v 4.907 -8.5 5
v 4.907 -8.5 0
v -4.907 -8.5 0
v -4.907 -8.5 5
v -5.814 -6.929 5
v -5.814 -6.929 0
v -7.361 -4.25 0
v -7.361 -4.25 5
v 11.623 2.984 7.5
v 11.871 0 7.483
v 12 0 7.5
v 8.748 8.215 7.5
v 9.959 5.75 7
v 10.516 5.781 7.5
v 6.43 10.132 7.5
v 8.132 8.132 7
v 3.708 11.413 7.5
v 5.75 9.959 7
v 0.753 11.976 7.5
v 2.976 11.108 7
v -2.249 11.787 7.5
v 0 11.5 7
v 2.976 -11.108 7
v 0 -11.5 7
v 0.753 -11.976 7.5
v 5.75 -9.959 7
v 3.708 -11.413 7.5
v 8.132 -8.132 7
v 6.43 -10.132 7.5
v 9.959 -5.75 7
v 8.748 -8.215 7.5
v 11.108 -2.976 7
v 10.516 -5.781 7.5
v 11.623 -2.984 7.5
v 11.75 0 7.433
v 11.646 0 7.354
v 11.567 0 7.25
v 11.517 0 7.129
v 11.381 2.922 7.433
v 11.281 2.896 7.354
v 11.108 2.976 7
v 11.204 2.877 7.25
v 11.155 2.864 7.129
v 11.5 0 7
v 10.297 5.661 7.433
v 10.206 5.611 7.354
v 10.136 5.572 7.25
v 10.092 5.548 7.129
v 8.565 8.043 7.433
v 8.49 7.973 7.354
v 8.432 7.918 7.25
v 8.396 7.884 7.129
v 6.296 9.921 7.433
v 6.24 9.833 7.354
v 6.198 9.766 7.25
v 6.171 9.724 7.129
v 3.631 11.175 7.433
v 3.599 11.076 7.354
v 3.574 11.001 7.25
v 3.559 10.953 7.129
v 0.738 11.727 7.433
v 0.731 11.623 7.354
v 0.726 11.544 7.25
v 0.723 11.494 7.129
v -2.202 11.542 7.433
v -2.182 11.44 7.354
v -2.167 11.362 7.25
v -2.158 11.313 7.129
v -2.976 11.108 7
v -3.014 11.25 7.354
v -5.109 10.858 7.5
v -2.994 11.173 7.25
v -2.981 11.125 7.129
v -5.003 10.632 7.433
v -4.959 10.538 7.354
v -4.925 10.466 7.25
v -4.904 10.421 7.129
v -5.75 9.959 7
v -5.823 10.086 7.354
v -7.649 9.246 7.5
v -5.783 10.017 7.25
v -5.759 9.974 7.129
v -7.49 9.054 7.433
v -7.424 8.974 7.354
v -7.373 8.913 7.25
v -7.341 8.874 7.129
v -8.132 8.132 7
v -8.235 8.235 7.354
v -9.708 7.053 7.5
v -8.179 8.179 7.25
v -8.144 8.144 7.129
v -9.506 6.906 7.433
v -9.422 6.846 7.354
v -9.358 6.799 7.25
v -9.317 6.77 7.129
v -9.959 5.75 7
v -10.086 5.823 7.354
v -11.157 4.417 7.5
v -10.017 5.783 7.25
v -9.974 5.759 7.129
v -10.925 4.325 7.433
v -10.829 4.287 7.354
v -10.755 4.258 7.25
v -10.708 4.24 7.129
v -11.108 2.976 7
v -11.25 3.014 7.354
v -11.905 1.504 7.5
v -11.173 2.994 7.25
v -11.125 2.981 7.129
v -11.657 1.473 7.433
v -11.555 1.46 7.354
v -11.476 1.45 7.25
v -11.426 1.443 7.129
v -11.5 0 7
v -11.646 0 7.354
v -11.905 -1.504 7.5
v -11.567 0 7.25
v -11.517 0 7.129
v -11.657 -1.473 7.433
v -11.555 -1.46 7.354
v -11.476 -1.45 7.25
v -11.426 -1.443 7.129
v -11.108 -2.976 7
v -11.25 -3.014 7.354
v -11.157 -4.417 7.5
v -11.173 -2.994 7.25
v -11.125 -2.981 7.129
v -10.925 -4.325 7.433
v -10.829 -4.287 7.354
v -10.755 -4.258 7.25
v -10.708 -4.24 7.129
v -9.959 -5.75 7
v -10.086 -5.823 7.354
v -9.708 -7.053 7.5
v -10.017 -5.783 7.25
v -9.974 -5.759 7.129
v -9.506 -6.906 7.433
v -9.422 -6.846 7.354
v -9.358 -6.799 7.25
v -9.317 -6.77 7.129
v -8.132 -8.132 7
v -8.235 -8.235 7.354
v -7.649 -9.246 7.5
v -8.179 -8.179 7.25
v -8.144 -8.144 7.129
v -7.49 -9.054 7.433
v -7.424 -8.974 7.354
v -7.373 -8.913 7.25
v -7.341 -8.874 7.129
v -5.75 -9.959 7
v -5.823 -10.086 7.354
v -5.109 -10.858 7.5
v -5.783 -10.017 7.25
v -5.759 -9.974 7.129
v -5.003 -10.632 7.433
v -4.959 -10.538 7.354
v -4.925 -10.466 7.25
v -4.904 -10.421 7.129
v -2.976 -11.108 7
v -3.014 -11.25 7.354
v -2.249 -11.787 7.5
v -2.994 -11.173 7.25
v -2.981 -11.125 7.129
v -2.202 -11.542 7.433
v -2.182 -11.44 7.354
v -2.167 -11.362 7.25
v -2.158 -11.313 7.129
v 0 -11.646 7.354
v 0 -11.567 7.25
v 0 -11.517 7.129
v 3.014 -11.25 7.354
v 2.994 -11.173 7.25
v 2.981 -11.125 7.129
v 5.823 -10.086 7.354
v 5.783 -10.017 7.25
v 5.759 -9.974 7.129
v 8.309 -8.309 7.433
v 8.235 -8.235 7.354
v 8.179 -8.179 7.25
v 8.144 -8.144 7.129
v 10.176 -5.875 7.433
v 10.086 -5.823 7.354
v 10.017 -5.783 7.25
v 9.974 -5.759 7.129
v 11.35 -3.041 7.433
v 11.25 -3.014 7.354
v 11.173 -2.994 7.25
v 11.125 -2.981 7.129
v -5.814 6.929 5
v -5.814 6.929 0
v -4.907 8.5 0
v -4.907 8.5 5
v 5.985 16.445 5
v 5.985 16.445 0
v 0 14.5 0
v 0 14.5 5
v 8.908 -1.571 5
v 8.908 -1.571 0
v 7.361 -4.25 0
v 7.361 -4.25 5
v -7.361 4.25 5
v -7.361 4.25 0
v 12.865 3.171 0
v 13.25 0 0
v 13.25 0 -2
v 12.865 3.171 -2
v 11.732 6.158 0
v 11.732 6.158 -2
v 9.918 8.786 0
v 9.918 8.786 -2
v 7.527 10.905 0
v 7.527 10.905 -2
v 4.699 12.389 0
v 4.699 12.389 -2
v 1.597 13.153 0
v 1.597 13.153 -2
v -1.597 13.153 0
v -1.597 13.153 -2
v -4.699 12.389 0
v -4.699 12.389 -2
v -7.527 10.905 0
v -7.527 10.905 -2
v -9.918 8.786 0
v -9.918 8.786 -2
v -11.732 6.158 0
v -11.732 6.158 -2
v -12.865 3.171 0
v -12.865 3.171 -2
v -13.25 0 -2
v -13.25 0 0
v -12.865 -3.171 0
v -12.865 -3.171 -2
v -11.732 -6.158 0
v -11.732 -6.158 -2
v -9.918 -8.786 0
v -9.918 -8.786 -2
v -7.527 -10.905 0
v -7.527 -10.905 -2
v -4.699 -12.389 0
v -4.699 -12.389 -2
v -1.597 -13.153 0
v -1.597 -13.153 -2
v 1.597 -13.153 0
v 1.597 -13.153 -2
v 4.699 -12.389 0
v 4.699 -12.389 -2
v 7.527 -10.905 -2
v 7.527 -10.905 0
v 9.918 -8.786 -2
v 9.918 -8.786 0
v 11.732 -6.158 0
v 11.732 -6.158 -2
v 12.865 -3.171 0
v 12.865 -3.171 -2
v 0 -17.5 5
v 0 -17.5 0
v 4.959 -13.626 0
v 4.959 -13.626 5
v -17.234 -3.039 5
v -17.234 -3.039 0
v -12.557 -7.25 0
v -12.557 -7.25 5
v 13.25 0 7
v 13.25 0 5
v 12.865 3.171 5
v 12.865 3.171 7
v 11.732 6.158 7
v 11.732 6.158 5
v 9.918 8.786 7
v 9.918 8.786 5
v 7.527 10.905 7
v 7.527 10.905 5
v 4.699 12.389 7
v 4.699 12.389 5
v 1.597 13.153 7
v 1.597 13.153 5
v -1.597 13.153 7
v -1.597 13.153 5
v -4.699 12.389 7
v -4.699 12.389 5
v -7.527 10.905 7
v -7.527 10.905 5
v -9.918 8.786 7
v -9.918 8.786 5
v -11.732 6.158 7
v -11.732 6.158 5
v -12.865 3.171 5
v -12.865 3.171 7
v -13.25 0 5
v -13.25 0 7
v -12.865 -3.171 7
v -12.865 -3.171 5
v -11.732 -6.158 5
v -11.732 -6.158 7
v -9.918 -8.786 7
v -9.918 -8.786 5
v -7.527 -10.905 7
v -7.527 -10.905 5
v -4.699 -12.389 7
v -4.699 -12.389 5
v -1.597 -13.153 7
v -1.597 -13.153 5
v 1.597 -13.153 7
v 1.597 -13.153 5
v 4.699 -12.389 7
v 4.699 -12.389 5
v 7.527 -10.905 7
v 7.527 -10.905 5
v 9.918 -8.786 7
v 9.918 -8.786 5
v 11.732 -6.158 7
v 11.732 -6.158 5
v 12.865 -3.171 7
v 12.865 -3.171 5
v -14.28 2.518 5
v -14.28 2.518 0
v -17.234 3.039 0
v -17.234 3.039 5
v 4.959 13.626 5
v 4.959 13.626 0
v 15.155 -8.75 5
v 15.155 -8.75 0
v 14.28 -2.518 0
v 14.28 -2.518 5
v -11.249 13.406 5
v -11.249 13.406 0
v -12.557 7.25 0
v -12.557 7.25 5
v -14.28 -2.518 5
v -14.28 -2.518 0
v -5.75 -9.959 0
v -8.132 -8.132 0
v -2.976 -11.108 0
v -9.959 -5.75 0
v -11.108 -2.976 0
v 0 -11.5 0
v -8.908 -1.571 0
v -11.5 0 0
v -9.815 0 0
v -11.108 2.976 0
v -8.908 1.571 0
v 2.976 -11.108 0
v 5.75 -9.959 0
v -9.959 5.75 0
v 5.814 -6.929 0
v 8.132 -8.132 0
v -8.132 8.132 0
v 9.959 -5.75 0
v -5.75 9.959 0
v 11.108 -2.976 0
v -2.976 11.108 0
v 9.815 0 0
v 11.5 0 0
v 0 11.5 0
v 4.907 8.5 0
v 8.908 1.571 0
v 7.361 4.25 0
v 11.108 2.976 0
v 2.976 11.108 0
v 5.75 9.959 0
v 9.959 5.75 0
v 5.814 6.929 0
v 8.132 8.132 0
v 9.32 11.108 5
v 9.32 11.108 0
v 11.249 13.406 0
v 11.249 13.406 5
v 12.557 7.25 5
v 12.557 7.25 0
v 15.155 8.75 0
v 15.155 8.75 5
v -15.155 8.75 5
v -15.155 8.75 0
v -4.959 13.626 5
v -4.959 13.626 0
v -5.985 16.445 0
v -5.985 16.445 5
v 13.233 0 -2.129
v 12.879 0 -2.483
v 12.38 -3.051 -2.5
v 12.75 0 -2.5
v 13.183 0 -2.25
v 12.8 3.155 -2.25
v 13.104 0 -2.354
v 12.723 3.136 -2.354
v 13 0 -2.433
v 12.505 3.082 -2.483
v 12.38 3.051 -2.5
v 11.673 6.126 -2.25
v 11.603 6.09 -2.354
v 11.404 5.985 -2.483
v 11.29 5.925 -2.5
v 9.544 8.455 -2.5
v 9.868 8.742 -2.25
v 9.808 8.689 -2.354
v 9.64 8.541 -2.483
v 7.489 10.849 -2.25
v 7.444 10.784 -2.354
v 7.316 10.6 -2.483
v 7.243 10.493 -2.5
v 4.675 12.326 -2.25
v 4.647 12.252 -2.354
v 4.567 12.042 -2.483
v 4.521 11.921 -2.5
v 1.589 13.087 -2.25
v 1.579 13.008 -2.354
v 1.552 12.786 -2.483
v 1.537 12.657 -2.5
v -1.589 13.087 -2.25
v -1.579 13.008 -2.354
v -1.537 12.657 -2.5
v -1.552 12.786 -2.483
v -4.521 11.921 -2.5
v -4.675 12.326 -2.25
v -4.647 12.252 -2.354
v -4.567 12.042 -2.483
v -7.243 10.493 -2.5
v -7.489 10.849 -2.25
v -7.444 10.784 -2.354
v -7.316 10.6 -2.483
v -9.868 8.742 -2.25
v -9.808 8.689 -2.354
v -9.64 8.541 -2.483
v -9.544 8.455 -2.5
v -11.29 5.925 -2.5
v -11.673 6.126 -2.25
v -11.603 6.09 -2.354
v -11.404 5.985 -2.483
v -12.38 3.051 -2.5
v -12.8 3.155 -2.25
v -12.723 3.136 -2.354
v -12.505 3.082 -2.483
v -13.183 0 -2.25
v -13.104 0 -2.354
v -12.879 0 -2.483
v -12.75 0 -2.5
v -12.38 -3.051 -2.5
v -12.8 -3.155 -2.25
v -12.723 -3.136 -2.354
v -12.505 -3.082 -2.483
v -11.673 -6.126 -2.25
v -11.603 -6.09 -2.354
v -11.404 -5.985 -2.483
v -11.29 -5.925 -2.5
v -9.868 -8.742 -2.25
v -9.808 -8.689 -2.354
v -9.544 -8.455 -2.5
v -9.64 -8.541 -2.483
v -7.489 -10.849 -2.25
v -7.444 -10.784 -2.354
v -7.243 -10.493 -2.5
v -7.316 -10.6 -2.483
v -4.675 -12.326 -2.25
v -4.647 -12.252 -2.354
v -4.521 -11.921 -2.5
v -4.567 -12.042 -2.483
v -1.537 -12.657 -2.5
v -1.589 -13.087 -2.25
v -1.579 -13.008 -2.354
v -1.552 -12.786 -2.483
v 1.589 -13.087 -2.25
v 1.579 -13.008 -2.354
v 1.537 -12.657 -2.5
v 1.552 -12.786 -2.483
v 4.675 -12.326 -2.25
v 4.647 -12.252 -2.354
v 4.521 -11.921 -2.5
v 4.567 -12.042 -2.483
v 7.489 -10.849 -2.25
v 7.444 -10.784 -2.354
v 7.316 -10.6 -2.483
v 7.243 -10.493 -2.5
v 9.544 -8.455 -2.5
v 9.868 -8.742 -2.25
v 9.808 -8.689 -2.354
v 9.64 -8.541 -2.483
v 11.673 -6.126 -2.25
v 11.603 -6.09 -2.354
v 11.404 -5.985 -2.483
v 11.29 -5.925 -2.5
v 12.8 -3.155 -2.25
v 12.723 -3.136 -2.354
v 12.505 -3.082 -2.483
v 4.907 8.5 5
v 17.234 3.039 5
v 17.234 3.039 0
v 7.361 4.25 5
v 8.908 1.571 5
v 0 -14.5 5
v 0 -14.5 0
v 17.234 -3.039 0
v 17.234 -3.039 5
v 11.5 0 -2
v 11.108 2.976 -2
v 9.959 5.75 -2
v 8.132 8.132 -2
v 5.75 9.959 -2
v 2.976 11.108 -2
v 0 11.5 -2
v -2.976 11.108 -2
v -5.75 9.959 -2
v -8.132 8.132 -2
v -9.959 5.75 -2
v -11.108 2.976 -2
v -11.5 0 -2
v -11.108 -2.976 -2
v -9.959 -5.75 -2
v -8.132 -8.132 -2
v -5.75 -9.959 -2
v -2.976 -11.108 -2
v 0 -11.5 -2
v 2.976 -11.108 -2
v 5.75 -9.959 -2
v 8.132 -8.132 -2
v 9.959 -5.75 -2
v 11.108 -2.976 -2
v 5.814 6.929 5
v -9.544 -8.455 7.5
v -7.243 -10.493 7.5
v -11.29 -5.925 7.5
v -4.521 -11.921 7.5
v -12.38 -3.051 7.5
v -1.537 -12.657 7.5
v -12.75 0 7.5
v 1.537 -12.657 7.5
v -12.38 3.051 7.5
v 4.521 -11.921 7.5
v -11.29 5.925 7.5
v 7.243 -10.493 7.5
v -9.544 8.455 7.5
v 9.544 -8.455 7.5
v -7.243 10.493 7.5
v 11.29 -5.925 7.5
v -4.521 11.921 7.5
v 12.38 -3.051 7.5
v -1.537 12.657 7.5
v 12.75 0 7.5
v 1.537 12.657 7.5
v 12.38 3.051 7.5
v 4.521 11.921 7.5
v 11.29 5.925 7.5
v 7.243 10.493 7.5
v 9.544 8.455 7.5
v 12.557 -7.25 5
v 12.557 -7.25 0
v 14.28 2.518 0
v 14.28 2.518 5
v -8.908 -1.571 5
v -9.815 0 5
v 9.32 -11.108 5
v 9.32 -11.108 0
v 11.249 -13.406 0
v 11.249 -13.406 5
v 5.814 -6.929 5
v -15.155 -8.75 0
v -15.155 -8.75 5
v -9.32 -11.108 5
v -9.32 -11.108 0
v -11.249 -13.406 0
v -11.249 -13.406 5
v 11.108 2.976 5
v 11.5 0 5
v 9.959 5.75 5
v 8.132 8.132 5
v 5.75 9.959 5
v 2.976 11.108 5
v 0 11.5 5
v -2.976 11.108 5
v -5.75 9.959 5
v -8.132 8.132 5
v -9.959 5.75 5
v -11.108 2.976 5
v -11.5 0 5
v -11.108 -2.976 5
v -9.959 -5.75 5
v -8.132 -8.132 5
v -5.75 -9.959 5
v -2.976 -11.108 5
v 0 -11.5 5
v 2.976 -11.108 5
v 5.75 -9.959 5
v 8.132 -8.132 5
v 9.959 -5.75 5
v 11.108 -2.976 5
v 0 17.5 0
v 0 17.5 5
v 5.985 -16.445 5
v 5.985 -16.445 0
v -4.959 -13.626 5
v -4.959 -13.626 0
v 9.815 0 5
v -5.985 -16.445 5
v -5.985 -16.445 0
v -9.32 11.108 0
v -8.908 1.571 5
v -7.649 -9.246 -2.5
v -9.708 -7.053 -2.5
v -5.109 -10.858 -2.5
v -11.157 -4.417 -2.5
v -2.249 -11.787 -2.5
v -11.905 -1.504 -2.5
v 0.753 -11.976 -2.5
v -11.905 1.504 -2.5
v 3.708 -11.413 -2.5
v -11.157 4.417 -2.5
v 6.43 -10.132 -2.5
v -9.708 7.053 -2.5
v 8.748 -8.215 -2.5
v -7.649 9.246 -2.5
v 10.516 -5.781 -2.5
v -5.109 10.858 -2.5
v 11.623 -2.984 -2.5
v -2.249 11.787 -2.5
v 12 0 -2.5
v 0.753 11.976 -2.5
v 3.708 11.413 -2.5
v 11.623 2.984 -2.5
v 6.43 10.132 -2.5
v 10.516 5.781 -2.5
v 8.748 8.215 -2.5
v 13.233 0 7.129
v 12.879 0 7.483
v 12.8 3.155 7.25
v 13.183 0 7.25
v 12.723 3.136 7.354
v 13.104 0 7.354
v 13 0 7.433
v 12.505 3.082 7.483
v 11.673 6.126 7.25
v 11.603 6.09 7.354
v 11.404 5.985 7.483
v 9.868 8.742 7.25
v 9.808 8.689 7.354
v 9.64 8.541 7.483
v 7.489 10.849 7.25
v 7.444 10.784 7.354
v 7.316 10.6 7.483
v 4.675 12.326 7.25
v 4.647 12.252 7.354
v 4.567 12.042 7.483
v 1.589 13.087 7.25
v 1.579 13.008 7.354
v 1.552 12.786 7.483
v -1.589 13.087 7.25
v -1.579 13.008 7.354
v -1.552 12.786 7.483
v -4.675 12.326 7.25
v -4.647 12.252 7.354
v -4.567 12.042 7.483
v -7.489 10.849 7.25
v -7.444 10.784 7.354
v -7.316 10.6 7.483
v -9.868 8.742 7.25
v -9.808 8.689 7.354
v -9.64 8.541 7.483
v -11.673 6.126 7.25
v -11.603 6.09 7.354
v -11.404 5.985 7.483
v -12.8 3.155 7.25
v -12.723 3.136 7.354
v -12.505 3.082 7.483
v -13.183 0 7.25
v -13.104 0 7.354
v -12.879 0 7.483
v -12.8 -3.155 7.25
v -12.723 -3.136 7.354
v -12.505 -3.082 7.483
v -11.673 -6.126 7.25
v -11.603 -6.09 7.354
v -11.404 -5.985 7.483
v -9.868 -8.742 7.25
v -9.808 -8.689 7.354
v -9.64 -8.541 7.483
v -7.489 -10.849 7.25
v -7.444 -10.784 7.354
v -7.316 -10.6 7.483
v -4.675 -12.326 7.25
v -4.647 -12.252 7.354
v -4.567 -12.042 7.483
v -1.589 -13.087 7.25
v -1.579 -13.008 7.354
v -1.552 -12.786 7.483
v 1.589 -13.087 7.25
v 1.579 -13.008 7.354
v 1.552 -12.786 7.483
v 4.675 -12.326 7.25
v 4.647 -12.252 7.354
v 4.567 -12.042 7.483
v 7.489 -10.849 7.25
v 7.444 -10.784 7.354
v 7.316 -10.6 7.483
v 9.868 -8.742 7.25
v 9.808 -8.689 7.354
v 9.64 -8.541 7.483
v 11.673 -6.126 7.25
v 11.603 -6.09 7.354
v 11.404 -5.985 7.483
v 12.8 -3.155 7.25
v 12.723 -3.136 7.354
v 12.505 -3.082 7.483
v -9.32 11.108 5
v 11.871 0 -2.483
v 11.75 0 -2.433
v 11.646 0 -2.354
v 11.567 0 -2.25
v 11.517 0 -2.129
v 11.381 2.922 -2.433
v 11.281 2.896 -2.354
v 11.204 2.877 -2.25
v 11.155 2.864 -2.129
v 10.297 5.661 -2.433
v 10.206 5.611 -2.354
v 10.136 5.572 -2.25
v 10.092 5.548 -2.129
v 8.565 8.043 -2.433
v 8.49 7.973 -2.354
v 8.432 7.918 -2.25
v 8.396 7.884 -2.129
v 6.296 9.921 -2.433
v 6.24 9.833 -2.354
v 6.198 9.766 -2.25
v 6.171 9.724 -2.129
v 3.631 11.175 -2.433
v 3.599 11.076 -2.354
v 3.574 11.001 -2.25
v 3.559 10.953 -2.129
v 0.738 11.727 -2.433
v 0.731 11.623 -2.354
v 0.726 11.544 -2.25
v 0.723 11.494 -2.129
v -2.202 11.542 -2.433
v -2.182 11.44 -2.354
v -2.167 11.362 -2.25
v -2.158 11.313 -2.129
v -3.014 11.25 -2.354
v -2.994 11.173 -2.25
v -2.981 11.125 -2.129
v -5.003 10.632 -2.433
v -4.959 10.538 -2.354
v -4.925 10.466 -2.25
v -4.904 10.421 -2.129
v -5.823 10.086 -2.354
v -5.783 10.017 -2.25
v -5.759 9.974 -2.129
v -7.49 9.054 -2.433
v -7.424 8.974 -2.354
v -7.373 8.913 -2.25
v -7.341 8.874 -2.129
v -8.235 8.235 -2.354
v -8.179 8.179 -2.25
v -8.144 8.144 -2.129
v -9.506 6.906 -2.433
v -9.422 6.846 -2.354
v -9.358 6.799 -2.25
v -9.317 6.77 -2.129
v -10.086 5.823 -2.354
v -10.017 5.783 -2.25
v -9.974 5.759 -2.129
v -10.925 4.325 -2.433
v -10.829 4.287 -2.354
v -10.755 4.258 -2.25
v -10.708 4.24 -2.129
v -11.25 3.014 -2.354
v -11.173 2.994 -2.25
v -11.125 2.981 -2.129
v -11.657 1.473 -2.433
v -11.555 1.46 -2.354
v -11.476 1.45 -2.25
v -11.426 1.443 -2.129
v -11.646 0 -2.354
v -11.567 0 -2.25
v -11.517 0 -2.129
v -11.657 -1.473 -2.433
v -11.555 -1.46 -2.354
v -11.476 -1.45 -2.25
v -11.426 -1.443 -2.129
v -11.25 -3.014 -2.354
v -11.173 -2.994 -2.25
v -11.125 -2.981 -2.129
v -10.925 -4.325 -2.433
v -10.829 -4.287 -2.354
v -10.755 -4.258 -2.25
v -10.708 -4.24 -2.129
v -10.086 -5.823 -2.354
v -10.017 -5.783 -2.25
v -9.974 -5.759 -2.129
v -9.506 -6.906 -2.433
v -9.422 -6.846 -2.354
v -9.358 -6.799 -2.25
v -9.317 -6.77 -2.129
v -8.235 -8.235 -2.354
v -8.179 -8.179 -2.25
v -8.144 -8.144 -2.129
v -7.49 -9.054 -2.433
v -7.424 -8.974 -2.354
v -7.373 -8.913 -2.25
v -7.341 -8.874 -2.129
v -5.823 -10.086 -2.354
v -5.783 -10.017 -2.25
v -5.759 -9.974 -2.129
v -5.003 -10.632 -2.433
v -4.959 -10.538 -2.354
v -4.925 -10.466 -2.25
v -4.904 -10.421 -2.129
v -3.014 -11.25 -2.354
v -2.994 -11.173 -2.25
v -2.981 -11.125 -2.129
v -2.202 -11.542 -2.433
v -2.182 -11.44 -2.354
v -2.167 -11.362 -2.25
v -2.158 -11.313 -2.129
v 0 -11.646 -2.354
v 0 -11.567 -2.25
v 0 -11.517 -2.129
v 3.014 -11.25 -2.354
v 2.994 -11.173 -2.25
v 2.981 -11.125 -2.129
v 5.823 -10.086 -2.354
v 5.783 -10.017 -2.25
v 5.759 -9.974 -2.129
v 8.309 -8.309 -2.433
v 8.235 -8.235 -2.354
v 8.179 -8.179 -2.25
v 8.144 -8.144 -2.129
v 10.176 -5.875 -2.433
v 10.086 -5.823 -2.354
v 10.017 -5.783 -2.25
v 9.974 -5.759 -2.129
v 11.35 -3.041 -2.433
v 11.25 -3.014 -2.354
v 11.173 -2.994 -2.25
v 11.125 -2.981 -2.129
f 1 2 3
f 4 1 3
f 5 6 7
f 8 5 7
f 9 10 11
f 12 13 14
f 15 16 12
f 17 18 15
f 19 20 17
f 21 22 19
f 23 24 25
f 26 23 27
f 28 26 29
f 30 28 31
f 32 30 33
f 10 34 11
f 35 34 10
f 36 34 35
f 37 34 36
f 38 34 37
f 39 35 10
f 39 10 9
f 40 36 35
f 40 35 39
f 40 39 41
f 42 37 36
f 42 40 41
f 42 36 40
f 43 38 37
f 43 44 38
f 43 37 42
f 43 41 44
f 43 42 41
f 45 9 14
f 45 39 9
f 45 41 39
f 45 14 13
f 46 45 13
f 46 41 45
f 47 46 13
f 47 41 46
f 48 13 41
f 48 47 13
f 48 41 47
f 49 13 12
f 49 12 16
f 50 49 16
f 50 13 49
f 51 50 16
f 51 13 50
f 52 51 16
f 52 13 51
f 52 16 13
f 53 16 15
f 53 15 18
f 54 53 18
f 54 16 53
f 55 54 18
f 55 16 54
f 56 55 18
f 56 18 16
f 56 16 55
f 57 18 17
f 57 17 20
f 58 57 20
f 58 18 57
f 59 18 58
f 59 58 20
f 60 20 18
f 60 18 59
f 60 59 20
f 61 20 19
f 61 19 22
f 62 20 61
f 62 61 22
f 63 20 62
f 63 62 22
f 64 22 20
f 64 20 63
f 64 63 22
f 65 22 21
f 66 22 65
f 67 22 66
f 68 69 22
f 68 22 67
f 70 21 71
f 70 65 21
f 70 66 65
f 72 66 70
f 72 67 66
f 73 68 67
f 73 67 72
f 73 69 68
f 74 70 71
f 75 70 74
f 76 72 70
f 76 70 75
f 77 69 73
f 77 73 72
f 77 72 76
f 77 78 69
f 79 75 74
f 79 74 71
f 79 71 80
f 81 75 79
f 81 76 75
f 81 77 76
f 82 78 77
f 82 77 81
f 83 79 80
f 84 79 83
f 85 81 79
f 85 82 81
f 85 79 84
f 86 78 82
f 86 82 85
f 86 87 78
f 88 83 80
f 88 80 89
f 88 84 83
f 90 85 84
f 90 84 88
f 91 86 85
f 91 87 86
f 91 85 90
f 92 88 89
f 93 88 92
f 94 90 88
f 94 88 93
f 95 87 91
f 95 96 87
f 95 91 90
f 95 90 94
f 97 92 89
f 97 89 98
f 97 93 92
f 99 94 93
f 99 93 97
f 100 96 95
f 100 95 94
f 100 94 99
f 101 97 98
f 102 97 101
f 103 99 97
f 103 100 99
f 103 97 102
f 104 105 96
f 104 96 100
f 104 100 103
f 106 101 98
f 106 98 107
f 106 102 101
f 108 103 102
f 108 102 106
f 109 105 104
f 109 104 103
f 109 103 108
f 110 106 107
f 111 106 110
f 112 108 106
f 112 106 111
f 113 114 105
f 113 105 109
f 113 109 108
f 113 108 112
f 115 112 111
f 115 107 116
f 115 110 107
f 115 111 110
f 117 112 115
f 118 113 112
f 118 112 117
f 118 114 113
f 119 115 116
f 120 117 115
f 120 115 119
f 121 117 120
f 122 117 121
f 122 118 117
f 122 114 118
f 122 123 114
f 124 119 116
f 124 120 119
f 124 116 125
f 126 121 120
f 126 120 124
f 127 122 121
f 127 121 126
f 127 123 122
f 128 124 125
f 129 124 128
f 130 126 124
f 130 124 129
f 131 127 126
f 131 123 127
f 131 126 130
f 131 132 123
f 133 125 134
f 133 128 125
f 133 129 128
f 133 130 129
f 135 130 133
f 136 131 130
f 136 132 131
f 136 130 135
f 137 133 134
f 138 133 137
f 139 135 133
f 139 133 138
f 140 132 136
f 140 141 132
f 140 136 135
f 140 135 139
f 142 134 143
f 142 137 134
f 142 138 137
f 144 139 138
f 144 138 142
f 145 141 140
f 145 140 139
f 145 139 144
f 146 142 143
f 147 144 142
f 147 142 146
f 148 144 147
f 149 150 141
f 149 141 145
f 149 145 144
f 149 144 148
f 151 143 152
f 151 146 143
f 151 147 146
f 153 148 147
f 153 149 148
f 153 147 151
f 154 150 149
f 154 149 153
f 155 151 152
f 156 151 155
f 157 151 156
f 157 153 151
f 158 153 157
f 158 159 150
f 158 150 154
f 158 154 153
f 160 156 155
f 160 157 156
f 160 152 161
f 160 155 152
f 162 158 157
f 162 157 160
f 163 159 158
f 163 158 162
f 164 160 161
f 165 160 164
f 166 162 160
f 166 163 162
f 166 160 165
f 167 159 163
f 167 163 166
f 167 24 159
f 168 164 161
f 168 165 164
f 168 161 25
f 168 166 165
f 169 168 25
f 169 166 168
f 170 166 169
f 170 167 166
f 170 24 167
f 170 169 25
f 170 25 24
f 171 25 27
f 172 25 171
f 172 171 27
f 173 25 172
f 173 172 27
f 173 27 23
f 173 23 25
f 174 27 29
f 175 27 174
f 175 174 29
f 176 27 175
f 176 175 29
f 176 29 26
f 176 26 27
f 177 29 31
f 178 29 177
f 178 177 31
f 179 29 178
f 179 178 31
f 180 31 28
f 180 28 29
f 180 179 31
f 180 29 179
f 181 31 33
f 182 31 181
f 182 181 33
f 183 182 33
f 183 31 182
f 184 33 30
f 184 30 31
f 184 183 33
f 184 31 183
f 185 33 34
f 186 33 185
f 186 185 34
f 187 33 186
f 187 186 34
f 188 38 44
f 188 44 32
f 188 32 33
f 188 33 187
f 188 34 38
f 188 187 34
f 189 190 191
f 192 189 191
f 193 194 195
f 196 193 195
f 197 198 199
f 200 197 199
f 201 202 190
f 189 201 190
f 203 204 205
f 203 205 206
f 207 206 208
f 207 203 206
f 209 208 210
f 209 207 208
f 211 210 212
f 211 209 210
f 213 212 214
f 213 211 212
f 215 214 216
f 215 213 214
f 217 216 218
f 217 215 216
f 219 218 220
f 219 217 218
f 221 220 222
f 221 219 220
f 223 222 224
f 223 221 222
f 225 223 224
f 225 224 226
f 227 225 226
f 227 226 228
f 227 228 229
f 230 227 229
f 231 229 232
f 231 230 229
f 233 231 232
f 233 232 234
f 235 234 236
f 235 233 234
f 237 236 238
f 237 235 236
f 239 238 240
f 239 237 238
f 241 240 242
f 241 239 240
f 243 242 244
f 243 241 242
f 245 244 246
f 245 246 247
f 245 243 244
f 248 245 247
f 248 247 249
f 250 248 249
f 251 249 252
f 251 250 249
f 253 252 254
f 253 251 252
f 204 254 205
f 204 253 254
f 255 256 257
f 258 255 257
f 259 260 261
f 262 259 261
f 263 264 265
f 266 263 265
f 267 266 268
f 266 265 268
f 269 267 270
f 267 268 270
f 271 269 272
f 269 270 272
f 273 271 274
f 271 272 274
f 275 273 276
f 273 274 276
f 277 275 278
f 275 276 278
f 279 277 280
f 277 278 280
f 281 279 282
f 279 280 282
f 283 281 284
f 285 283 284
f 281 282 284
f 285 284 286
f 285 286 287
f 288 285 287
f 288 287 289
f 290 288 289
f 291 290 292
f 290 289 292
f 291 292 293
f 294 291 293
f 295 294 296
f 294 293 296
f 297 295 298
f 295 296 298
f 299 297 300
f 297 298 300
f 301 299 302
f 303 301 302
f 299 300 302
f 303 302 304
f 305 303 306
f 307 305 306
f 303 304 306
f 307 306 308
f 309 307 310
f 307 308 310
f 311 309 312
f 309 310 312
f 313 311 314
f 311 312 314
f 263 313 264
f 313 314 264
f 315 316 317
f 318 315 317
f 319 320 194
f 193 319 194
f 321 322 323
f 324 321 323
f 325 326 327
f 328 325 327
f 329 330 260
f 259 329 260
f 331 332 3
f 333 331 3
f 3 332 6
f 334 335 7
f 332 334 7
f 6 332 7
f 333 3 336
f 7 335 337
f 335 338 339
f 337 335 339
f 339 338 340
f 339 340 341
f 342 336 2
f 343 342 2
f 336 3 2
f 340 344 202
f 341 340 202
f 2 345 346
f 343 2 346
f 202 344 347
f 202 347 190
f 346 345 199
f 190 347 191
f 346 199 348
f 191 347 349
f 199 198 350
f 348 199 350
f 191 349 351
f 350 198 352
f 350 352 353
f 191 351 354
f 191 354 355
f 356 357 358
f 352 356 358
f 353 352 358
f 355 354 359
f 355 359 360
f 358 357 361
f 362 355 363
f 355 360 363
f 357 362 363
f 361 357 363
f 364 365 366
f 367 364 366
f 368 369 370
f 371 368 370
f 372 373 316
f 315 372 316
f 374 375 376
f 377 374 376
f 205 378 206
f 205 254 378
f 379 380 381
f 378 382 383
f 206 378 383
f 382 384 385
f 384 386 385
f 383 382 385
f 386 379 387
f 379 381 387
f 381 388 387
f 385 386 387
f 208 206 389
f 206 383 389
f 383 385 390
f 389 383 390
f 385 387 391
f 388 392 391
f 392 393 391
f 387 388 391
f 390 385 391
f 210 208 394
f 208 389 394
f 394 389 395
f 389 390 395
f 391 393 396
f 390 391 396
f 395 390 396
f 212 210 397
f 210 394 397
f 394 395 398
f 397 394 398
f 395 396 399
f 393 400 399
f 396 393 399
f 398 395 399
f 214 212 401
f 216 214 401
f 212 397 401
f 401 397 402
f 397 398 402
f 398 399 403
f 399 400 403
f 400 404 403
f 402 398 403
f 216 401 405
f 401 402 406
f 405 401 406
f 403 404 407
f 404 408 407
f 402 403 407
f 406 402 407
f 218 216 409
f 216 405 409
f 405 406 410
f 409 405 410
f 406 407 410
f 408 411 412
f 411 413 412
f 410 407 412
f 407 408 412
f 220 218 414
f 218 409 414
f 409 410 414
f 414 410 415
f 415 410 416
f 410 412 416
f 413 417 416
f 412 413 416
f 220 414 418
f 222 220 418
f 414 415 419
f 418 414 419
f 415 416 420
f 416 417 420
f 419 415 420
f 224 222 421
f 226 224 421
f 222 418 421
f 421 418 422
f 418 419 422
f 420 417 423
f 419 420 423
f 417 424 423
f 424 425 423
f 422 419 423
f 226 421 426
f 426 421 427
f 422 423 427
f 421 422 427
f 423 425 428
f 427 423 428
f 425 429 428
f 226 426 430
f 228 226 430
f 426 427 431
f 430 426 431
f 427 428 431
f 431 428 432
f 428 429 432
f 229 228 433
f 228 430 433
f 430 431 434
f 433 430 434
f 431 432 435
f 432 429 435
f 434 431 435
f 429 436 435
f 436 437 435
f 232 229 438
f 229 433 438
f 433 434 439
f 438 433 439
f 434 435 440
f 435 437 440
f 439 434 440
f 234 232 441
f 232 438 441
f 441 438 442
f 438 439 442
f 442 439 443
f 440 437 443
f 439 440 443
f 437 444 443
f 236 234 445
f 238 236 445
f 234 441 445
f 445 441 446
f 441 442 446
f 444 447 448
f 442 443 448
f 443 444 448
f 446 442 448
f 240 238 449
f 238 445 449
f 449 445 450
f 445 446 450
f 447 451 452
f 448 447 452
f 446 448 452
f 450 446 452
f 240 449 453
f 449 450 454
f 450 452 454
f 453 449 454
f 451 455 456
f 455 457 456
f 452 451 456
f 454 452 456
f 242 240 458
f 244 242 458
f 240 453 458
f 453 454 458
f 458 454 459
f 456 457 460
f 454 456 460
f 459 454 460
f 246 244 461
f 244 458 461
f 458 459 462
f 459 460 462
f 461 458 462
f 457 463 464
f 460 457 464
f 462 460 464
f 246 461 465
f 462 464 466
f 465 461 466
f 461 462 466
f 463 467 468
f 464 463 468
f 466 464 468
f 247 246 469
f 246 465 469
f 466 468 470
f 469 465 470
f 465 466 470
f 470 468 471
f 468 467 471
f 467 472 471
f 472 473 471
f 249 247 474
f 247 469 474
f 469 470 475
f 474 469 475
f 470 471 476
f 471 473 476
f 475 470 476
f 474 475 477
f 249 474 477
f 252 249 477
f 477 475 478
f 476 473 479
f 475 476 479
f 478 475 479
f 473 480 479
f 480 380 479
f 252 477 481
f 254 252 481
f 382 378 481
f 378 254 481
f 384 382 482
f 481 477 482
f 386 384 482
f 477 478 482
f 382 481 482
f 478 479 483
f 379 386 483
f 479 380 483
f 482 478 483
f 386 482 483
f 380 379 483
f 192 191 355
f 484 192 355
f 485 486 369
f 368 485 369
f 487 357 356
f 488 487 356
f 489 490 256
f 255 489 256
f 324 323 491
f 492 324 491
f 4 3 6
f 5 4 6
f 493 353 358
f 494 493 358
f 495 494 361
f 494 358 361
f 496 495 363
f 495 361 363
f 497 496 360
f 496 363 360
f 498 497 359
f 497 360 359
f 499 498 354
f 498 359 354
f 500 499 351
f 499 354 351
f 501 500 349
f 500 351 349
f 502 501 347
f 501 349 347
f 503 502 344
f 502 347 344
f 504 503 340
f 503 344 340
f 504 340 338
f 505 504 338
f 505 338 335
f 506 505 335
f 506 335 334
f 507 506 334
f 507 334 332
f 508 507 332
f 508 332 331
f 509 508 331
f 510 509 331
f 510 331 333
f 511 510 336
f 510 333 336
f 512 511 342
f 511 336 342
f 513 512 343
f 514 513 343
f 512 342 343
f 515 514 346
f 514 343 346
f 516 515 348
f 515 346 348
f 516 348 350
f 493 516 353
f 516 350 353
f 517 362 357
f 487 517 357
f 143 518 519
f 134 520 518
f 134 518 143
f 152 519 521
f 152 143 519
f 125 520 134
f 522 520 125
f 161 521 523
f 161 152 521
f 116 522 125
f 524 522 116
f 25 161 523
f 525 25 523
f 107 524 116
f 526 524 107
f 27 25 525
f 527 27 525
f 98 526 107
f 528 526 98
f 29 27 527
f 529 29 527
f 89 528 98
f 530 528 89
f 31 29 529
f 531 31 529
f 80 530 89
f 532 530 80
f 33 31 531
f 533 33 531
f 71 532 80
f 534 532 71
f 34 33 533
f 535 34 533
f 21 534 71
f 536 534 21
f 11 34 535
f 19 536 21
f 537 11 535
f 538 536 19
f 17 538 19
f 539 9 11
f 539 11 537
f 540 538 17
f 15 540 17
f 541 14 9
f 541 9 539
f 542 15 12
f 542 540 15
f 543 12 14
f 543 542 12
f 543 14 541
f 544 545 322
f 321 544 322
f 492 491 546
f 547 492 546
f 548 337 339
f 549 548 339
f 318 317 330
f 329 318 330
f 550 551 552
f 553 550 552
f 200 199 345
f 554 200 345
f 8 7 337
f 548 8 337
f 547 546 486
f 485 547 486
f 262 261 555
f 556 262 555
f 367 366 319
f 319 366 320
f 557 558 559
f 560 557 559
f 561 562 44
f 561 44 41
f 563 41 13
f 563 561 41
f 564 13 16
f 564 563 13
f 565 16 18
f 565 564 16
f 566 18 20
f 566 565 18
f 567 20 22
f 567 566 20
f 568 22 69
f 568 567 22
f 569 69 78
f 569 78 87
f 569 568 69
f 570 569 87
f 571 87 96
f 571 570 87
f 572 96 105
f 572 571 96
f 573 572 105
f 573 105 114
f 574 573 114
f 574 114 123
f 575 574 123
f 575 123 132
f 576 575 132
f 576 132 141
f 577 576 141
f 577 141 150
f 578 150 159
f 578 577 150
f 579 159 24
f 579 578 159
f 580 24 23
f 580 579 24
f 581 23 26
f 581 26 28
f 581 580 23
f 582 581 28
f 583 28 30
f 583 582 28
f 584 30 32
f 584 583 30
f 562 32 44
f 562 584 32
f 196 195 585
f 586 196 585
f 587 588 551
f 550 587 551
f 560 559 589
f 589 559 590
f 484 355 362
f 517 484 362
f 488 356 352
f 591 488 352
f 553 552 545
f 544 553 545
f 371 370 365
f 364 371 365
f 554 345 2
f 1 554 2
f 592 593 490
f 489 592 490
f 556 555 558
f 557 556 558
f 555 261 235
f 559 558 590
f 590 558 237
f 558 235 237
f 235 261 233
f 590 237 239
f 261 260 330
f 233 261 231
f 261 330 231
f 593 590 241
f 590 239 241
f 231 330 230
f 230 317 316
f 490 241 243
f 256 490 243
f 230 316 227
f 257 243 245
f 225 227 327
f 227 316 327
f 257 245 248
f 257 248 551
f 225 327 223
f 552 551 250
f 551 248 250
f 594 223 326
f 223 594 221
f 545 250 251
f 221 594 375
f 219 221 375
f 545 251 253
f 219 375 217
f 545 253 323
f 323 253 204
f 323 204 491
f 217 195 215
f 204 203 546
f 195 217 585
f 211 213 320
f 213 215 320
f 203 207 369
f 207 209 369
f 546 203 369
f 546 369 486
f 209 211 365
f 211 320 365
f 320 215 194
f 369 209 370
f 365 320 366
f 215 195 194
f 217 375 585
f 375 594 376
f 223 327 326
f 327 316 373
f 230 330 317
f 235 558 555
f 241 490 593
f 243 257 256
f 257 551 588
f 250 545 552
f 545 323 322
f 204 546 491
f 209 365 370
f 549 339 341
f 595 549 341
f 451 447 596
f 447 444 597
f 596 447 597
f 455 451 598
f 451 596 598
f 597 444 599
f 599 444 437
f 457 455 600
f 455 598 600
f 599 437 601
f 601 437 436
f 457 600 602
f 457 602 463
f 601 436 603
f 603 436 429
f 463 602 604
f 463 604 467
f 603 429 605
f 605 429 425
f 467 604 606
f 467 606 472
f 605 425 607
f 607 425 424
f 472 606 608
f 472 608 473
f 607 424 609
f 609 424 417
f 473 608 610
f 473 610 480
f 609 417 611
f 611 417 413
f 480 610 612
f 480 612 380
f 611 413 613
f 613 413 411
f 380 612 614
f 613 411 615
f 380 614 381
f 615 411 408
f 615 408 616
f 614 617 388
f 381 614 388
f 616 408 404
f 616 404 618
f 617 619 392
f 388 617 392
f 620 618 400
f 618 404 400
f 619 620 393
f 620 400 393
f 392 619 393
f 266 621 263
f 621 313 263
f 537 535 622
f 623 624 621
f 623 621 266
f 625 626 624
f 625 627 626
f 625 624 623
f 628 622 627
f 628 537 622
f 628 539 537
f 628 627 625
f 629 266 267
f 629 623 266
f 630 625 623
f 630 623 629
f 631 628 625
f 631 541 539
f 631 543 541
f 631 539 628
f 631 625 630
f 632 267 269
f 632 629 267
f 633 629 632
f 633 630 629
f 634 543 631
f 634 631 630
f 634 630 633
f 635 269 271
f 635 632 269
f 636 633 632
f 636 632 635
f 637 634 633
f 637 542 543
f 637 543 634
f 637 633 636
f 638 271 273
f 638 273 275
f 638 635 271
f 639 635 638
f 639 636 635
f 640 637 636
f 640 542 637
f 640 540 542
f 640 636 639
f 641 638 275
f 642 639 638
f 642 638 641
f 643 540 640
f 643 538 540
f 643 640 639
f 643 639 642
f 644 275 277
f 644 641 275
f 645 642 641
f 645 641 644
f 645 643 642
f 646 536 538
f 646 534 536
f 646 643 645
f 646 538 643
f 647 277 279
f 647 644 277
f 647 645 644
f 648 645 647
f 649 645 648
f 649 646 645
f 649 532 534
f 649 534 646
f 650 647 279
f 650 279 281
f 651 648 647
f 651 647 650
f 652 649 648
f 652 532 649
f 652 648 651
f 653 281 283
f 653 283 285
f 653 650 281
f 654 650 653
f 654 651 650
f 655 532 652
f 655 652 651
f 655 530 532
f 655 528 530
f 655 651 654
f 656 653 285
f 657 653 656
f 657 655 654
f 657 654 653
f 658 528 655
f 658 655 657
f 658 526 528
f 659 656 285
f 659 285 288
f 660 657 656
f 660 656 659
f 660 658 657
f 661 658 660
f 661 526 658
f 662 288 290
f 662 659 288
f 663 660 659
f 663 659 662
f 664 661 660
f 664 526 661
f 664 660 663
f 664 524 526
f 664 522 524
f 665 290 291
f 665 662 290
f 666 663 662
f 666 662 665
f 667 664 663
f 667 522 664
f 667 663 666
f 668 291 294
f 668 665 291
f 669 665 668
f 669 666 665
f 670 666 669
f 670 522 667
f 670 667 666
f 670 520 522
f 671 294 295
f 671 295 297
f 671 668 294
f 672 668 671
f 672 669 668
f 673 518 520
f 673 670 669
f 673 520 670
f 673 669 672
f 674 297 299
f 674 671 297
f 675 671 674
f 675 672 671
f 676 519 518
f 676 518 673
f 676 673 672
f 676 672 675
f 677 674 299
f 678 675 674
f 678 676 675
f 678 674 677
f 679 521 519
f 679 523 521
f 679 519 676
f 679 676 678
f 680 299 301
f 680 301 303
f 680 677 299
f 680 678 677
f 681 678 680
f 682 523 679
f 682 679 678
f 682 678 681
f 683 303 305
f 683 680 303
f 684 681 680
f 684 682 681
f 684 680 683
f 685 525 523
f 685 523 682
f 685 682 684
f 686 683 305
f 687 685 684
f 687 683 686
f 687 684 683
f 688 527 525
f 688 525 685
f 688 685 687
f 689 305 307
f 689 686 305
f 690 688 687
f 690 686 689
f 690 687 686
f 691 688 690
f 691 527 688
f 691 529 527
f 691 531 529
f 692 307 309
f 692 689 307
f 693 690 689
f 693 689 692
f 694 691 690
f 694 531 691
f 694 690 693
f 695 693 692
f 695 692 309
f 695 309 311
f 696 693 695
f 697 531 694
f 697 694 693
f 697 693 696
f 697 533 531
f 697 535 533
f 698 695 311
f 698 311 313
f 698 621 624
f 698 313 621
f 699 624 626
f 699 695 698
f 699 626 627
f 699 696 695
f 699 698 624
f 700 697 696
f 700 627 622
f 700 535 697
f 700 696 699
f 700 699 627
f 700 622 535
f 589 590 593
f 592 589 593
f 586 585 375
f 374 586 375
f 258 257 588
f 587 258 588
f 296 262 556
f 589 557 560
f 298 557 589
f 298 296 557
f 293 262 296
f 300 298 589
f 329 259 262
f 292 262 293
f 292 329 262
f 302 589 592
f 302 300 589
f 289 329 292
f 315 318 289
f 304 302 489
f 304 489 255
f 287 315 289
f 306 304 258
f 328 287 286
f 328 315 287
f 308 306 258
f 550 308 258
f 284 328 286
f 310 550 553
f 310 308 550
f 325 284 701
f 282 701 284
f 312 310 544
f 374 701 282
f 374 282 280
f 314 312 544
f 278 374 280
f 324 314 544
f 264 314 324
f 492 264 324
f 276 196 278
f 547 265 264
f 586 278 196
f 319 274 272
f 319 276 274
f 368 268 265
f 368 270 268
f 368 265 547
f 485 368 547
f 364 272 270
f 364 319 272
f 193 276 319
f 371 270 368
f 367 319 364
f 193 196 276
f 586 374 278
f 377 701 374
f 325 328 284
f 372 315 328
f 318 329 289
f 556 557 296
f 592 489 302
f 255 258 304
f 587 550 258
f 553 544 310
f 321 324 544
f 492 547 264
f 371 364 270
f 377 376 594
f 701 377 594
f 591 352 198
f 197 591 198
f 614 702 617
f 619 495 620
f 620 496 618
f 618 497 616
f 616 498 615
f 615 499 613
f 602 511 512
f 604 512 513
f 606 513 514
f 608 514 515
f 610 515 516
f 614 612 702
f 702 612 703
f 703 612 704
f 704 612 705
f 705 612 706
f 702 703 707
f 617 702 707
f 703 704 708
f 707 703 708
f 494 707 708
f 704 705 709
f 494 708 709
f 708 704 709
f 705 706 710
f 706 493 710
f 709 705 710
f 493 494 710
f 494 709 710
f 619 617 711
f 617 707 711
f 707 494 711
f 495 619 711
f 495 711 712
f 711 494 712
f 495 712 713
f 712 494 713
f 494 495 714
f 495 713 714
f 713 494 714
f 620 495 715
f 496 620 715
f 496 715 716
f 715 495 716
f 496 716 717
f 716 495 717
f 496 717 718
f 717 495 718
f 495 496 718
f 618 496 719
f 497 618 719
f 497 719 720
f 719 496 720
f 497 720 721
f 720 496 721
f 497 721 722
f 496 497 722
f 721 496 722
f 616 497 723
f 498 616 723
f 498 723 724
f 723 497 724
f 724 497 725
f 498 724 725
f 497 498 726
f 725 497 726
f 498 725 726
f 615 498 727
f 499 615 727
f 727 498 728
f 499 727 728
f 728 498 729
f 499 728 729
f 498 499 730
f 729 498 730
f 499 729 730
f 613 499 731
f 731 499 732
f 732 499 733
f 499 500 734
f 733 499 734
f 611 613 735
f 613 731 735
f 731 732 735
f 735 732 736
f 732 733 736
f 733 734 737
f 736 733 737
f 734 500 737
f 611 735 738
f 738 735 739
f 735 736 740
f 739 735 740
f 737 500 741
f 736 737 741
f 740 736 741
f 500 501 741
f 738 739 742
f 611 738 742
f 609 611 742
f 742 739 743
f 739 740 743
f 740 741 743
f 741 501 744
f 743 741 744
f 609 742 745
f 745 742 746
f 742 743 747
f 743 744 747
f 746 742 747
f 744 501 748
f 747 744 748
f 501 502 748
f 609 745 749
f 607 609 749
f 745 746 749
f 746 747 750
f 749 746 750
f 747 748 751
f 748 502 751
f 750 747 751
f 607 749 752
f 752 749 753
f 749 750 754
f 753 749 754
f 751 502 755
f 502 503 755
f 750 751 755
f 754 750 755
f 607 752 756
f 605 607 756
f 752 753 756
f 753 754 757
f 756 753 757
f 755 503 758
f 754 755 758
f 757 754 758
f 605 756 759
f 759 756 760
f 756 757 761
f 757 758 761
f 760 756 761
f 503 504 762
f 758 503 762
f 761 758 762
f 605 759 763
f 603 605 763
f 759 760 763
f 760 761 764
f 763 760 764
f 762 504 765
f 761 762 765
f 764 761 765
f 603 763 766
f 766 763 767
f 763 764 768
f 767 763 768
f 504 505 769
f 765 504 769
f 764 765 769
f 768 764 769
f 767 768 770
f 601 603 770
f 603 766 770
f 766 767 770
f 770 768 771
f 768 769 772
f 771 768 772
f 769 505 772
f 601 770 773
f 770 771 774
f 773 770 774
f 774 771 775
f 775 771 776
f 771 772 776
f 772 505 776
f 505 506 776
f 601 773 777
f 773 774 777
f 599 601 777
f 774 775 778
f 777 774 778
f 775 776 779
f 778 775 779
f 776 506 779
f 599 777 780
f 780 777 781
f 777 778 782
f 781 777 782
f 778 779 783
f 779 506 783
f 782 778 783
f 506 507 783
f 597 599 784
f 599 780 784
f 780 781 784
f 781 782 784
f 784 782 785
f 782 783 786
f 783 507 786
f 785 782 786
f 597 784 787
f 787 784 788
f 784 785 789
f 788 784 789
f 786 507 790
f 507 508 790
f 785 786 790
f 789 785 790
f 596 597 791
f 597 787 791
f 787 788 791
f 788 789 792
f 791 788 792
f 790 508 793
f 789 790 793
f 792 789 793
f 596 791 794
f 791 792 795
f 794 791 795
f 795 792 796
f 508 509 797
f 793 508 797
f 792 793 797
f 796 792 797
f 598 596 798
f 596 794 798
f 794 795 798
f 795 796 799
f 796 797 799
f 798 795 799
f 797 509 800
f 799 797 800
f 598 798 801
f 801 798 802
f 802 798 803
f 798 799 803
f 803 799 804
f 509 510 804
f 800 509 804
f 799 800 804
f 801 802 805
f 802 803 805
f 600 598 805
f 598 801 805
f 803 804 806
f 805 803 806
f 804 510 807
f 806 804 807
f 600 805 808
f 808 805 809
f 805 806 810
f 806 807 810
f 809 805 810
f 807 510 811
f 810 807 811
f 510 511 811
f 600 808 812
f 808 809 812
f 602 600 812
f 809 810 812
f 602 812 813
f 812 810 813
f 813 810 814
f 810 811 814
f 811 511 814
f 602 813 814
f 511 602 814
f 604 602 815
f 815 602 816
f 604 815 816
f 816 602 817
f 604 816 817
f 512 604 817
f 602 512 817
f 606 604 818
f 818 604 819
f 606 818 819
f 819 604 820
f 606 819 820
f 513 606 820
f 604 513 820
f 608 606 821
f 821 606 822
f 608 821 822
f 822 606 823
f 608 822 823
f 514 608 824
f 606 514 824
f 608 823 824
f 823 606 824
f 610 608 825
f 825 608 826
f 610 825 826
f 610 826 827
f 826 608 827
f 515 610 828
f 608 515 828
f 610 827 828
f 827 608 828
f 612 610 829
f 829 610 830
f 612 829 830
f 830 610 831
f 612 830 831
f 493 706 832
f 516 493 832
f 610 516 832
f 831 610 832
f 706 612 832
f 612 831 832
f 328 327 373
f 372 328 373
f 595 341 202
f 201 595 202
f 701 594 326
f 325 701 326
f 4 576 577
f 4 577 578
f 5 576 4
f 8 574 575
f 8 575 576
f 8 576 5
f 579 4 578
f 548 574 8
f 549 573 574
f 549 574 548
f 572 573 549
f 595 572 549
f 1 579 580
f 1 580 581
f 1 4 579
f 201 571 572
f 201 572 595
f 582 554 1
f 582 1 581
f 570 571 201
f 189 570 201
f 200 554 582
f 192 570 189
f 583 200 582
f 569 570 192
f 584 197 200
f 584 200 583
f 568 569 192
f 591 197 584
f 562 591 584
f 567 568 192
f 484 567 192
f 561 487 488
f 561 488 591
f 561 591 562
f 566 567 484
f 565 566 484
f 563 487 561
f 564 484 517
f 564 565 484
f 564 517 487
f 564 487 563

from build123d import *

# Parameters (mm, degrees)
F1_DEPTH = 5
F2_R     = 13.25
F2_R_2   = 11.5
F3_DEPTH = 2.5
F4_R     = 13.25
F4_R_2   = 11.5
F5_DEPTH = 2.5
F6_R     = 0.5


with BuildPart() as f1:
    # F0 (on Top) → F1 (new body)
    with BuildSketch(Plane.XY):
        with BuildLine():
            Line((3.0937469913, 8.5), (4.9592920782, 13.6255430014))
            ThreePointArc((4.9592920782, 13.6255430014), (2.5178985762, 14.2797124187), (0, 14.5))
            Line((0, 14.5), (0, 8.5))
            Line((0, 8.5), (3.0937469913, 8.5))
        make_face()
        with BuildLine():
            ThreePointArc((0, 14.5), (2.5178985762, 14.2797124187), (4.9592920782, 13.6255430014))
            Line((4.9592920782, 13.6255430014), (5.9853525082, 16.4446208638))
            Line((5.9853525082, 16.4446208638), (0, 14.5))
        make_face()
        with BuildLine():
            Line((-3.0937469913, 8.5), (0, 8.5))
            Line((0, 8.5), (0, 14.5))
            ThreePointArc((0, 14.5), (-2.5178985762, 14.2797124187), (-4.9592920782, 13.6255430014))
            Line((-4.9592920782, 13.6255430014), (-3.0937469913, 8.5))
        make_face()
        with BuildLine():
            ThreePointArc((-4.9592920782, 13.6255430014), (-2.5178985762, 14.2797124187), (0, 14.5))
            Line((0, 14.5), (0, 17.5))
            Line((0, 17.5), (-4.9592920782, 13.6255430014))
        make_face()
        with BuildLine():
            Line((5.8143424365, 6.9292634873), (9.3204203405, 11.1076444252))
            ThreePointArc((9.3204203405, 11.1076444252), (7.25, 12.5573683549), (4.9592920782, 13.6255430014))
            Line((4.9592920782, 13.6255430014), (3.0937469913, 8.5))
            Line((3.0937469913, 8.5), (4.9074772881, 8.5))
            Line((4.9074772881, 8.5), (5.8143424365, 6.9292634873))
        make_face()
        with BuildLine():
            ThreePointArc((4.9592920782, 13.6255430014), (7.25, 12.5573683549), (9.3204203405, 11.1076444252))
            Line((9.3204203405, 11.1076444252), (11.2487831695, 13.4057777546))
            Line((11.2487831695, 13.4057777546), (4.9592920782, 13.6255430014))
        make_face()
        with BuildLine():
            ThreePointArc((9.3204203405, 11.1076444252), (11.1076444252, 9.3204203405), (12.5573683549, 7.25))
            Line((12.5573683549, 7.25), (15.1554445662, 8.75))
            Line((15.1554445662, 8.75), (9.3204203405, 11.1076444252))
        make_face()
        with BuildLine():
            Line((8.9080894278, 1.5707365127), (14.2797124187, 2.5178985762))
            ThreePointArc((14.2797124187, 2.5178985762), (13.6255430014, 4.9592920782), (12.5573683549, 7.25))
            Line((12.5573683549, 7.25), (7.3612159322, 4.25))
            Line((7.3612159322, 4.25), (8.9080894278, 1.5707365127))
        make_face()
        with BuildLine():
            ThreePointArc((12.5573683549, 7.25), (13.6255430014, 4.9592920782), (14.2797124187, 2.5178985762))
            Line((14.2797124187, 2.5178985762), (17.2341356777, 3.0388431092))
            Line((17.2341356777, 3.0388431092), (12.5573683549, 7.25))
        make_face()
        with BuildLine():
            ThreePointArc((14.2797124187, -2.5178985762), (14.4448231223, -1.2637582698), (14.5, 0))
            ThreePointArc((14.5, 0), (14.4448231223, 1.2637582698), (14.2797124187, 2.5178985762))
            Line((14.2797124187, 2.5178985762), (8.9080894278, 1.5707365127))
            Line((8.9080894278, 1.5707365127), (9.8149545762, 0))
            Line((9.8149545762, 0), (8.9080894278, -1.5707365127))
            Line((8.9080894278, -1.5707365127), (14.2797124187, -2.5178985762))
        make_face()
        with BuildLine():
            ThreePointArc((14.2797124187, 2.5178985762), (14.4448231223, 1.2637582698), (14.5, 0))
            ThreePointArc((14.5, 0), (14.4448231223, -1.2637582698), (14.2797124187, -2.5178985762))
            Line((14.2797124187, -2.5178985762), (17.2341356777, -3.0388431092))
            Line((17.2341356777, -3.0388431092), (14.2797124187, 2.5178985762))
        make_face()
        with BuildLine():
            ThreePointArc((12.5573683549, -7.25), (13.6255430014, -4.9592920782), (14.2797124187, -2.5178985762))
            Line((14.2797124187, -2.5178985762), (8.9080894278, -1.5707365127))
            Line((8.9080894278, -1.5707365127), (7.3612159322, -4.25))
            Line((7.3612159322, -4.25), (12.5573683549, -7.25))
        make_face()
        with BuildLine():
            Line((15.1554445662, -8.75), (14.2797124187, -2.5178985762))
            ThreePointArc((14.2797124187, -2.5178985762), (13.6255430014, -4.9592920782), (12.5573683549, -7.25))
            Line((12.5573683549, -7.25), (15.1554445662, -8.75))
        make_face()
        with BuildLine():
            ThreePointArc((9.3204203405, -11.1076444252), (11.1076444252, -9.3204203405), (12.5573683549, -7.25))
            Line((12.5573683549, -7.25), (7.3612159322, -4.25))
            Line((7.3612159322, -4.25), (5.8143424365, -6.9292634873))
            Line((5.8143424365, -6.9292634873), (9.3204203405, -11.1076444252))
        make_face()
        with BuildLine():
            Line((11.2487831695, -13.4057777546), (12.5573683549, -7.25))
            ThreePointArc((12.5573683549, -7.25), (11.1076444252, -9.3204203405), (9.3204203405, -11.1076444252))
            Line((9.3204203405, -11.1076444252), (11.2487831695, -13.4057777546))
        make_face()
        with BuildLine():
            ThreePointArc((4.9592920782, -13.6255430014), (7.25, -12.5573683549), (9.3204203405, -11.1076444252))
            Line((9.3204203405, -11.1076444252), (5.8143424365, -6.9292634873))
            Line((5.8143424365, -6.9292634873), (4.9074772881, -8.5))
            Line((4.9074772881, -8.5), (3.0937469913, -8.5))
            Line((3.0937469913, -8.5), (4.9592920782, -13.6255430014))
        make_face()
        with BuildLine():
            Line((5.9853525082, -16.4446208638), (9.3204203405, -11.1076444252))
            ThreePointArc((9.3204203405, -11.1076444252), (7.25, -12.5573683549), (4.9592920782, -13.6255430014))
            Line((4.9592920782, -13.6255430014), (5.9853525082, -16.4446208638))
        make_face()
        with BuildLine():
            Line((0, -17.5), (4.9592920782, -13.6255430014))
            ThreePointArc((4.9592920782, -13.6255430014), (2.5178985762, -14.2797124187), (0, -14.5))
            Line((0, -14.5), (0, -17.5))
        make_face()
        with BuildLine():
            Line((0, -8.5), (-3.0937469913, -8.5))
            Line((-3.0937469913, -8.5), (-4.9592920782, -13.6255430014))
            ThreePointArc((-4.9592920782, -13.6255430014), (-2.5178985762, -14.2797124187), (0, -14.5))
            Line((0, -14.5), (0, -8.5))
        make_face()
        with BuildLine():
            ThreePointArc((0, -14.5), (-2.5178985762, -14.2797124187), (-4.9592920782, -13.6255430014))
            Line((-4.9592920782, -13.6255430014), (-5.9853525082, -16.4446208638))
            Line((-5.9853525082, -16.4446208638), (0, -14.5))
        make_face()
        with BuildLine():
            Line((7.3612159322, 4.25), (12.5573683549, 7.25))
            ThreePointArc((12.5573683549, 7.25), (11.1076444252, 9.3204203405), (9.3204203405, 11.1076444252))
            Line((9.3204203405, 11.1076444252), (5.8143424365, 6.9292634873))
            Line((5.8143424365, 6.9292634873), (7.3612159322, 4.25))
        make_face()
        with BuildLine():
            Line((3.0937469913, -8.5), (0, -8.5))
            Line((0, -8.5), (0, -14.5))
            ThreePointArc((0, -14.5), (2.5178985762, -14.2797124187), (4.9592920782, -13.6255430014))
            Line((4.9592920782, -13.6255430014), (3.0937469913, -8.5))
        make_face()
        with BuildLine():
            Line((-4.9074772881, -8.5), (-5.8143424365, -6.9292634873))
            Line((-5.8143424365, -6.9292634873), (-9.3204203405, -11.1076444252))
            ThreePointArc((-9.3204203405, -11.1076444252), (-7.25, -12.5573683549), (-4.9592920782, -13.6255430014))
            Line((-4.9592920782, -13.6255430014), (-3.0937469913, -8.5))
            Line((-3.0937469913, -8.5), (-4.9074772881, -8.5))
        make_face()
        with BuildLine():
            ThreePointArc((-4.9592920782, -13.6255430014), (-7.25, -12.5573683549), (-9.3204203405, -11.1076444252))
            Line((-9.3204203405, -11.1076444252), (-11.2487831695, -13.4057777546))
            Line((-11.2487831695, -13.4057777546), (-4.9592920782, -13.6255430014))
        make_face()
        with BuildLine():
            ThreePointArc((-9.3204203405, -11.1076444252), (-11.1076444252, -9.3204203405), (-12.5573683549, -7.25))
            Line((-12.5573683549, -7.25), (-15.1554445662, -8.75))
            Line((-15.1554445662, -8.75), (-9.3204203405, -11.1076444252))
        make_face()
        with BuildLine():
            Line((-5.8143424365, -6.9292634873), (-7.3612159322, -4.25))
            Line((-7.3612159322, -4.25), (-12.5573683549, -7.25))
            ThreePointArc((-12.5573683549, -7.25), (-11.1076444252, -9.3204203405), (-9.3204203405, -11.1076444252))
            Line((-9.3204203405, -11.1076444252), (-5.8143424365, -6.9292634873))
        make_face()
        with BuildLine():
            ThreePointArc((-12.5573683549, -7.25), (-13.6255430014, -4.9592920782), (-14.2797124187, -2.5178985762))
            Line((-14.2797124187, -2.5178985762), (-17.2341356777, -3.0388431092))
            Line((-17.2341356777, -3.0388431092), (-12.5573683549, -7.25))
        make_face()
        with BuildLine():
            Line((-7.3612159322, -4.25), (-8.9080894278, -1.5707365127))
            Line((-8.9080894278, -1.5707365127), (-14.2797124187, -2.5178985762))
            ThreePointArc((-14.2797124187, -2.5178985762), (-13.6255430014, -4.9592920782), (-12.5573683549, -7.25))
            Line((-12.5573683549, -7.25), (-7.3612159322, -4.25))
        make_face()
        with BuildLine():
            ThreePointArc((-14.2797124187, -2.5178985762), (-14.5, 0), (-14.2797124187, 2.5178985762))
            Line((-14.2797124187, 2.5178985762), (-17.2341356777, 3.0388431092))
            Line((-17.2341356777, 3.0388431092), (-14.2797124187, -2.5178985762))
        make_face()
        with BuildLine():
            Line((-9.8149545762, 0), (-8.9080894278, 1.5707365127))
            Line((-8.9080894278, 1.5707365127), (-14.2797124187, 2.5178985762))
            ThreePointArc((-14.2797124187, 2.5178985762), (-14.5, 0), (-14.2797124187, -2.5178985762))
            Line((-14.2797124187, -2.5178985762), (-8.9080894278, -1.5707365127))
            Line((-8.9080894278, -1.5707365127), (-9.8149545762, 0))
        make_face()
        with BuildLine():
            ThreePointArc((-14.2797124187, 2.5178985762), (-13.6255430014, 4.9592920782), (-12.5573683549, 7.25))
            Line((-12.5573683549, 7.25), (-15.1554445662, 8.75))
            Line((-15.1554445662, 8.75), (-14.2797124187, 2.5178985762))
        make_face()
        with BuildLine():
            Line((-8.9080894278, 1.5707365127), (-7.3612159322, 4.25))
            Line((-7.3612159322, 4.25), (-12.5573683549, 7.25))
            ThreePointArc((-12.5573683549, 7.25), (-13.6255430014, 4.9592920782), (-14.2797124187, 2.5178985762))
            Line((-14.2797124187, 2.5178985762), (-8.9080894278, 1.5707365127))
        make_face()
        with BuildLine():
            ThreePointArc((-12.5573683549, 7.25), (-11.1076444252, 9.3204203405), (-9.3204203405, 11.1076444252))
            Line((-9.3204203405, 11.1076444252), (-11.2487831695, 13.4057777546))
            Line((-11.2487831695, 13.4057777546), (-12.5573683549, 7.25))
        make_face()
        with BuildLine():
            Line((-7.3612159322, 4.25), (-5.8143424365, 6.9292634873))
            Line((-5.8143424365, 6.9292634873), (-9.3204203405, 11.1076444252))
            ThreePointArc((-9.3204203405, 11.1076444252), (-11.1076444252, 9.3204203405), (-12.5573683549, 7.25))
            Line((-12.5573683549, 7.25), (-7.3612159322, 4.25))
        make_face()
        with BuildLine():
            ThreePointArc((-9.3204203405, 11.1076444252), (-7.25, 12.5573683549), (-4.9592920782, 13.6255430014))
            Line((-4.9592920782, 13.6255430014), (-5.9853525082, 16.4446208638))
            Line((-5.9853525082, 16.4446208638), (-9.3204203405, 11.1076444252))
        make_face()
        with BuildLine():
            Line((-4.9074772881, 8.5), (-3.0937469913, 8.5))
            Line((-3.0937469913, 8.5), (-4.9592920782, 13.6255430014))
            ThreePointArc((-4.9592920782, 13.6255430014), (-7.25, 12.5573683549), (-9.3204203405, 11.1076444252))
            Line((-9.3204203405, 11.1076444252), (-5.8143424365, 6.9292634873))
            Line((-5.8143424365, 6.9292634873), (-4.9074772881, 8.5))
        make_face()
    extrude(amount=F1_DEPTH)

    # F2 (on face) → F3 (join)
    with BuildSketch(Plane.XY.offset(5)):
        Circle(F2_R)
        Circle(F2_R_2, mode=Mode.SUBTRACT)
    extrude(amount=F3_DEPTH)

    # F4 (on face) → F5 (join)
    with BuildSketch(Plane.XY):
        Circle(F4_R)
        Circle(F4_R_2, mode=Mode.SUBTRACT)
    extrude(amount=-F5_DEPTH)

    # F6
    f6_edges = [f1.edges().sort_by_distance(p)[0] for p in [
        (-13.25, 0, 7.5),
        (-11.5, 0, 7.5),
        (-13.25, 0, -2.5),
        (-11.5, 0, -2.5),
    ]]
    fillet(f6_edges, radius=F6_R)


solid = f1.part
